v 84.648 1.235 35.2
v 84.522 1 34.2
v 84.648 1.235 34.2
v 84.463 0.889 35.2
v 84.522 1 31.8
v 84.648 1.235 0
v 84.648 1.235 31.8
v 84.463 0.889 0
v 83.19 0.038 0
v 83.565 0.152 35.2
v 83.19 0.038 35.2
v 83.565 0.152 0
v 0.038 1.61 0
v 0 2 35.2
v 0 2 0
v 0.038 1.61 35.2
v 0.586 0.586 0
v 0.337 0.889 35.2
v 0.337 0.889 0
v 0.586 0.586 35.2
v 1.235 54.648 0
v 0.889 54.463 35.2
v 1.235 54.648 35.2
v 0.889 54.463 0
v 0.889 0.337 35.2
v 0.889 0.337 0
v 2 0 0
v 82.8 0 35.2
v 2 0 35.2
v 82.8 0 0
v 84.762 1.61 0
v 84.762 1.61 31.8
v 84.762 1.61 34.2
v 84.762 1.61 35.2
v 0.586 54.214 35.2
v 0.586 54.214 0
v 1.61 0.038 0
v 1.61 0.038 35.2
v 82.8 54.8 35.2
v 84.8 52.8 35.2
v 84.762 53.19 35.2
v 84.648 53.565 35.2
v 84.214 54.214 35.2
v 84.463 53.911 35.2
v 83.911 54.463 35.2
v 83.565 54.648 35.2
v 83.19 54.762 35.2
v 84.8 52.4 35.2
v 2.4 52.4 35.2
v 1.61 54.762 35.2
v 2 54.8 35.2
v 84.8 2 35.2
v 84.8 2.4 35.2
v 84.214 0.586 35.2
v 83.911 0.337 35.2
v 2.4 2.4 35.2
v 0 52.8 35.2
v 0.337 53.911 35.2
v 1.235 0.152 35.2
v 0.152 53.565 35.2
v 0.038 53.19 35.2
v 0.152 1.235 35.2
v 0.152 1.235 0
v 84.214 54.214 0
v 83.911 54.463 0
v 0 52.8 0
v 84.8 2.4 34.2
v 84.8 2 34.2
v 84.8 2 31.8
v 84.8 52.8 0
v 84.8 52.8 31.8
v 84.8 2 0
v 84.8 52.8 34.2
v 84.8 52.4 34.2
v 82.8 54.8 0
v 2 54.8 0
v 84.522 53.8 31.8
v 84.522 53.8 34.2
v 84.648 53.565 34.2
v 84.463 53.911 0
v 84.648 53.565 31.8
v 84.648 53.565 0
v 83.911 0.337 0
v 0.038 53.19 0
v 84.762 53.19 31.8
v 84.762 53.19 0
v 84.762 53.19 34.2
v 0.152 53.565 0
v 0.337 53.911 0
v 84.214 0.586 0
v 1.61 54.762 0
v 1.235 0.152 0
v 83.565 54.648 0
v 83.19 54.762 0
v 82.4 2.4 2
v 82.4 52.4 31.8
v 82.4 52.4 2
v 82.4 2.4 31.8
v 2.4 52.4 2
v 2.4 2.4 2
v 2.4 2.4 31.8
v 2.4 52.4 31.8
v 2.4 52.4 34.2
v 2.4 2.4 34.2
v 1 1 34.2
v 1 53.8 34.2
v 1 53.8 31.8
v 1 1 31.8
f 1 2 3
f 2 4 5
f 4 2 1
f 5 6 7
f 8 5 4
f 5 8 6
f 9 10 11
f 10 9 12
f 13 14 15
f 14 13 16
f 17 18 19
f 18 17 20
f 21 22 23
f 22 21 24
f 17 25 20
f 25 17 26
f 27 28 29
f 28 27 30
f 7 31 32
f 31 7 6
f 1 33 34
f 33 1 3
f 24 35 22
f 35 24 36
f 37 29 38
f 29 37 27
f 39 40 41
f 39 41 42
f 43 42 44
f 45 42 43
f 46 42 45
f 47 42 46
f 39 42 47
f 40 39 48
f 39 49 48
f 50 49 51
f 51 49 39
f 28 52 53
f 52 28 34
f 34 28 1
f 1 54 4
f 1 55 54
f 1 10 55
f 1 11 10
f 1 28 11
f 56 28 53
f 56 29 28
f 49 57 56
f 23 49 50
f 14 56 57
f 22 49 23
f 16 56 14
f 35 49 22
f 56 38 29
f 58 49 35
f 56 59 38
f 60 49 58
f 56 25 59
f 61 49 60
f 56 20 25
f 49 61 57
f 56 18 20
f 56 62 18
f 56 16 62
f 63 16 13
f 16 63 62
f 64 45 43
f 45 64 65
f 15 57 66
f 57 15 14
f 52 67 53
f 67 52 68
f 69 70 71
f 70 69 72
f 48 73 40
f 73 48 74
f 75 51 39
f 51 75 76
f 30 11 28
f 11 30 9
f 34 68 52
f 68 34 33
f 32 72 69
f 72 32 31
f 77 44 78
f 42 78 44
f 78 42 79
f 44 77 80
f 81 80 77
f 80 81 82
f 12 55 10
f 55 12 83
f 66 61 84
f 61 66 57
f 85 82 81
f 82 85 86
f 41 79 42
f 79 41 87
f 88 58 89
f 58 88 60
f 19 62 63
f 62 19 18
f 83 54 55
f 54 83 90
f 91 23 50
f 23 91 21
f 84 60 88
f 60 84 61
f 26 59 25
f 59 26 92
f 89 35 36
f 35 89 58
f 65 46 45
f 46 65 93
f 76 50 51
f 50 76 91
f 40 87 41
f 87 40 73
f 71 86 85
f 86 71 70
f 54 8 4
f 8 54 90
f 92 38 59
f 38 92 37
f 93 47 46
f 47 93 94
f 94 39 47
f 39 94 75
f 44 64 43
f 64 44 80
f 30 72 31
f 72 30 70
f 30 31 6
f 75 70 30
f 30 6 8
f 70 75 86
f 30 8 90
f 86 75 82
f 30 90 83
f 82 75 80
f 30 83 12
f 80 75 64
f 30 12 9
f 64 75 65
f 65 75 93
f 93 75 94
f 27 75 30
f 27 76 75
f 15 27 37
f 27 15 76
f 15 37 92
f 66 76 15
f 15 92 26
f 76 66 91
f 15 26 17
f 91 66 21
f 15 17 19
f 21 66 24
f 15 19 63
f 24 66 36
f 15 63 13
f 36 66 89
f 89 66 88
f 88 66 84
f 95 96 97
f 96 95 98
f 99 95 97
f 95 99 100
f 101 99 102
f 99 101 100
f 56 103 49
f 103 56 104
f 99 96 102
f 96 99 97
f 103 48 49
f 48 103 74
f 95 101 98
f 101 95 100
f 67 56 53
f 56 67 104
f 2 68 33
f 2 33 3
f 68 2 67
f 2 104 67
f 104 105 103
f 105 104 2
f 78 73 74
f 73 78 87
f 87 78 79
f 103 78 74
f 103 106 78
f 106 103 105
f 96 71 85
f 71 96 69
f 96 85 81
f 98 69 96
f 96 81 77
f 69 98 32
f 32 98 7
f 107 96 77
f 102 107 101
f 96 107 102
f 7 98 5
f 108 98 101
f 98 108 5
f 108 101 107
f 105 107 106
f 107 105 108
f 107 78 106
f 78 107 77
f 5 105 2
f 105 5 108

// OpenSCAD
// file: ../lib/shapes.scad
// ============================================================
// Sliding-Lid Box (demo)  |  Shared shape helpers
// ------------------------------------------------------------
// Building blocks with no printed part of their own. Reached with
// `use <../lib/shapes.scad>`. hull() of true cylinders (not rotate +
// linear_extrude) keeps results manifold -- docs/conventions/geometry.md.
// ============================================================

// Box with rounded vertical edges; origin at the outer front-left-bottom
// corner.  size = [x, y, z] mm, r = edge radius mm (0 = plain cube).
module rounded_block(size, r = 0) {
    if (r <= 0) {
        cube(size);
    } else {
        hull() {
            for (x = [r, size[0] - r], y = [r, size[1] - r])
                translate([x, y, 0])
                    cylinder(h = size[2], r = r);
        }
    }
}

// Centered 2D label, extruded `h` mm upward from z = 0.
module label_solid(text_value, size, font, h) {
    linear_extrude(height = h)
        text(text_value, size = size, font = font, halign = "center", valign = "center");
}
// file: ../lib/params.scad
// ============================================================
// Sliding-Lid Box (demo)  |  Global parameters
// ------------------------------------------------------------
// WORKED EXAMPLE of the boilerplate conventions -- compare with the
// commented stub in the repo-root lib/params.scad, which explains every
// rule. What this file demonstrates:
//   - customizer tabs, sliders, a dropdown, a checkbox
//   - a user-facing COLOR parameter: hex string + `// color`, kept
//     distinct in the MakerWorld bundle via COLOR_PASSTHROUGH
//     (examples/demo/scripts/project_config.sh)
//   - a user-facing FONT parameter: `// font`, with a default that is in
//     PMM's INSTALLED font inventory AND bundled with desktop OpenSCAD
//   - a clearance that widens the CAVITY (the lid groove), never the part
//   - [Hidden] constants, then derived values computed once
// ============================================================

/* [BOX] */

// Inside length (X), in mm
inner_length = 80; // [30:1:200]

// Inside width (Y), in mm
inner_width = 50; // [20:1:150]

// Inside height (Z), in mm
inner_height = 30; // [10:1:100]

// Wall thickness, in mm
wall = 2.4; // [1.6:0.2:5]

// Floor thickness, in mm
floor_thickness = 2; // [1.2:0.2:5]

/* [LID LABEL] */

// Label style (None to disable)
label_style = "engraved"; // [none:None, engraved:Engraved (cut in), embossed:Embossed (raised)]

// Label text
label_text = "BOX";

// Label size, in mm
label_size = 10; // [4:1:30]

// Label font
label_font = "Liberation Sans:style=Bold"; // font

// Embossed label color (multi-color printing)
label_color = "#E67E22"; // color

/* [CLEARANCES - TUNE FOR YOUR PRINTER] */

// Lid fit: gap added to the groove the lid slides in (mm)
lid_clearance = 0.2; // [0:0.05:0.6]

/* [Hidden] */

// ---- Fixed design constants ----
lid_thickness = 2;          // nominal lid plate thickness -- never shrunk for fit
lip_height = 1.2;           // solid rim above the groove, holding the lid down
label_depth = 0.6;          // engrave depth / emboss height
notch_radius = 6;           // finger notch at the lid's pull end
corner_radius = 2;          // outer vertical-edge rounding

// ---- Visualization colors (local previews; flattened in the bundle) ----
box_color = "SteelBlue";
lid_color = "LightSlateGray";

// ---- Layout spacing ----
// Clear space between stacked views on the assembly preview plate. Which
// views appear comes from ASSEMBLY_PLATE_VIEWS (scripts/plates_config.sh).
assembly_view_gap = 20;

// ---- Render quality (what PMM renders) ----
$fa = 2;
$fs = 0.4;

// ---- Derived values (single source of truth) ----
// Groove depth into each long side wall: half the wall, so the remaining
// wall behind the groove is never thinner than the groove itself.
groove_depth = wall / 2;

outer_length = inner_length + 2 * wall;
outer_width  = inner_width + 2 * wall;
outer_height = floor_thickness + inner_height + lid_thickness + lip_height;

// Groove: sits right on top of the cavity. Widened by lid_clearance on
// every face -- the lid itself stays at its nominal size.
groove_z      = floor_thickness + inner_height - lid_clearance;
groove_height = lid_thickness + 2 * lid_clearance;
groove_y0     = wall - groove_depth - lid_clearance;
groove_width  = inner_width + 2 * (groove_depth + lid_clearance);

// Lid: runs from the far groove end (x = wall - groove_depth) to flush
// with the open end of the box (x = outer_length).
lid_length = outer_length - (wall - groove_depth);
lid_width  = inner_width + 2 * groove_depth;

// Assembled lid position (inside the groove, centered in its clearance).
lid_x = wall - groove_depth;
lid_y = wall - groove_depth;
lid_z = groove_z + lid_clearance;
// main file
// ============================================================
// Sliding-Lid Box (demo)  |  Part: box_body
// ------------------------------------------------------------
// Open-top box with a groove along both long side walls that the lid
// slides into from the +X end, whose end wall is cut down to let it in.
//
// Conventions shown (docs/conventions/geometry.md):
//   - origin at the outer front-left-bottom corner, print orientation
//     (open top up -- the only overhang is the groove ceiling, about
//     1.4 mm deep at defaults, which bridges without support)
//   - lid_clearance widens the GROOVE (params.scad); the lid is nominal
//   - every cut overshoots the surface it opens by 1 mm (the "+ 1"s) so
//     no two faces are coincident -- do not "clean these up"
// ============================================================

include <../lib/params.scad>

use <../lib/shapes.scad>

module box_body() {
    difference() {
        rounded_block([outer_length, outer_width, outer_height], corner_radius);

        // Cavity, open to the top.
        translate([wall, wall, floor_thickness])
            cube([inner_length, inner_width, outer_height]);

        // Lid groove, running out through the +X end wall.
        translate([wall - groove_depth - lid_clearance, groove_y0, groove_z])
            cube([outer_length, groove_width, groove_height]);

        // +X end wall removed above the groove floor, so the lid can pass.
        translate([outer_length - wall - 1, wall, groove_z])
            cube([wall + 2, inner_width, outer_height]);
    }
}

// BUILD:EXCLUDE-START (standalone preview only; stripped from every bundle)
color(box_color) box_body();
// BUILD:EXCLUDE-END
